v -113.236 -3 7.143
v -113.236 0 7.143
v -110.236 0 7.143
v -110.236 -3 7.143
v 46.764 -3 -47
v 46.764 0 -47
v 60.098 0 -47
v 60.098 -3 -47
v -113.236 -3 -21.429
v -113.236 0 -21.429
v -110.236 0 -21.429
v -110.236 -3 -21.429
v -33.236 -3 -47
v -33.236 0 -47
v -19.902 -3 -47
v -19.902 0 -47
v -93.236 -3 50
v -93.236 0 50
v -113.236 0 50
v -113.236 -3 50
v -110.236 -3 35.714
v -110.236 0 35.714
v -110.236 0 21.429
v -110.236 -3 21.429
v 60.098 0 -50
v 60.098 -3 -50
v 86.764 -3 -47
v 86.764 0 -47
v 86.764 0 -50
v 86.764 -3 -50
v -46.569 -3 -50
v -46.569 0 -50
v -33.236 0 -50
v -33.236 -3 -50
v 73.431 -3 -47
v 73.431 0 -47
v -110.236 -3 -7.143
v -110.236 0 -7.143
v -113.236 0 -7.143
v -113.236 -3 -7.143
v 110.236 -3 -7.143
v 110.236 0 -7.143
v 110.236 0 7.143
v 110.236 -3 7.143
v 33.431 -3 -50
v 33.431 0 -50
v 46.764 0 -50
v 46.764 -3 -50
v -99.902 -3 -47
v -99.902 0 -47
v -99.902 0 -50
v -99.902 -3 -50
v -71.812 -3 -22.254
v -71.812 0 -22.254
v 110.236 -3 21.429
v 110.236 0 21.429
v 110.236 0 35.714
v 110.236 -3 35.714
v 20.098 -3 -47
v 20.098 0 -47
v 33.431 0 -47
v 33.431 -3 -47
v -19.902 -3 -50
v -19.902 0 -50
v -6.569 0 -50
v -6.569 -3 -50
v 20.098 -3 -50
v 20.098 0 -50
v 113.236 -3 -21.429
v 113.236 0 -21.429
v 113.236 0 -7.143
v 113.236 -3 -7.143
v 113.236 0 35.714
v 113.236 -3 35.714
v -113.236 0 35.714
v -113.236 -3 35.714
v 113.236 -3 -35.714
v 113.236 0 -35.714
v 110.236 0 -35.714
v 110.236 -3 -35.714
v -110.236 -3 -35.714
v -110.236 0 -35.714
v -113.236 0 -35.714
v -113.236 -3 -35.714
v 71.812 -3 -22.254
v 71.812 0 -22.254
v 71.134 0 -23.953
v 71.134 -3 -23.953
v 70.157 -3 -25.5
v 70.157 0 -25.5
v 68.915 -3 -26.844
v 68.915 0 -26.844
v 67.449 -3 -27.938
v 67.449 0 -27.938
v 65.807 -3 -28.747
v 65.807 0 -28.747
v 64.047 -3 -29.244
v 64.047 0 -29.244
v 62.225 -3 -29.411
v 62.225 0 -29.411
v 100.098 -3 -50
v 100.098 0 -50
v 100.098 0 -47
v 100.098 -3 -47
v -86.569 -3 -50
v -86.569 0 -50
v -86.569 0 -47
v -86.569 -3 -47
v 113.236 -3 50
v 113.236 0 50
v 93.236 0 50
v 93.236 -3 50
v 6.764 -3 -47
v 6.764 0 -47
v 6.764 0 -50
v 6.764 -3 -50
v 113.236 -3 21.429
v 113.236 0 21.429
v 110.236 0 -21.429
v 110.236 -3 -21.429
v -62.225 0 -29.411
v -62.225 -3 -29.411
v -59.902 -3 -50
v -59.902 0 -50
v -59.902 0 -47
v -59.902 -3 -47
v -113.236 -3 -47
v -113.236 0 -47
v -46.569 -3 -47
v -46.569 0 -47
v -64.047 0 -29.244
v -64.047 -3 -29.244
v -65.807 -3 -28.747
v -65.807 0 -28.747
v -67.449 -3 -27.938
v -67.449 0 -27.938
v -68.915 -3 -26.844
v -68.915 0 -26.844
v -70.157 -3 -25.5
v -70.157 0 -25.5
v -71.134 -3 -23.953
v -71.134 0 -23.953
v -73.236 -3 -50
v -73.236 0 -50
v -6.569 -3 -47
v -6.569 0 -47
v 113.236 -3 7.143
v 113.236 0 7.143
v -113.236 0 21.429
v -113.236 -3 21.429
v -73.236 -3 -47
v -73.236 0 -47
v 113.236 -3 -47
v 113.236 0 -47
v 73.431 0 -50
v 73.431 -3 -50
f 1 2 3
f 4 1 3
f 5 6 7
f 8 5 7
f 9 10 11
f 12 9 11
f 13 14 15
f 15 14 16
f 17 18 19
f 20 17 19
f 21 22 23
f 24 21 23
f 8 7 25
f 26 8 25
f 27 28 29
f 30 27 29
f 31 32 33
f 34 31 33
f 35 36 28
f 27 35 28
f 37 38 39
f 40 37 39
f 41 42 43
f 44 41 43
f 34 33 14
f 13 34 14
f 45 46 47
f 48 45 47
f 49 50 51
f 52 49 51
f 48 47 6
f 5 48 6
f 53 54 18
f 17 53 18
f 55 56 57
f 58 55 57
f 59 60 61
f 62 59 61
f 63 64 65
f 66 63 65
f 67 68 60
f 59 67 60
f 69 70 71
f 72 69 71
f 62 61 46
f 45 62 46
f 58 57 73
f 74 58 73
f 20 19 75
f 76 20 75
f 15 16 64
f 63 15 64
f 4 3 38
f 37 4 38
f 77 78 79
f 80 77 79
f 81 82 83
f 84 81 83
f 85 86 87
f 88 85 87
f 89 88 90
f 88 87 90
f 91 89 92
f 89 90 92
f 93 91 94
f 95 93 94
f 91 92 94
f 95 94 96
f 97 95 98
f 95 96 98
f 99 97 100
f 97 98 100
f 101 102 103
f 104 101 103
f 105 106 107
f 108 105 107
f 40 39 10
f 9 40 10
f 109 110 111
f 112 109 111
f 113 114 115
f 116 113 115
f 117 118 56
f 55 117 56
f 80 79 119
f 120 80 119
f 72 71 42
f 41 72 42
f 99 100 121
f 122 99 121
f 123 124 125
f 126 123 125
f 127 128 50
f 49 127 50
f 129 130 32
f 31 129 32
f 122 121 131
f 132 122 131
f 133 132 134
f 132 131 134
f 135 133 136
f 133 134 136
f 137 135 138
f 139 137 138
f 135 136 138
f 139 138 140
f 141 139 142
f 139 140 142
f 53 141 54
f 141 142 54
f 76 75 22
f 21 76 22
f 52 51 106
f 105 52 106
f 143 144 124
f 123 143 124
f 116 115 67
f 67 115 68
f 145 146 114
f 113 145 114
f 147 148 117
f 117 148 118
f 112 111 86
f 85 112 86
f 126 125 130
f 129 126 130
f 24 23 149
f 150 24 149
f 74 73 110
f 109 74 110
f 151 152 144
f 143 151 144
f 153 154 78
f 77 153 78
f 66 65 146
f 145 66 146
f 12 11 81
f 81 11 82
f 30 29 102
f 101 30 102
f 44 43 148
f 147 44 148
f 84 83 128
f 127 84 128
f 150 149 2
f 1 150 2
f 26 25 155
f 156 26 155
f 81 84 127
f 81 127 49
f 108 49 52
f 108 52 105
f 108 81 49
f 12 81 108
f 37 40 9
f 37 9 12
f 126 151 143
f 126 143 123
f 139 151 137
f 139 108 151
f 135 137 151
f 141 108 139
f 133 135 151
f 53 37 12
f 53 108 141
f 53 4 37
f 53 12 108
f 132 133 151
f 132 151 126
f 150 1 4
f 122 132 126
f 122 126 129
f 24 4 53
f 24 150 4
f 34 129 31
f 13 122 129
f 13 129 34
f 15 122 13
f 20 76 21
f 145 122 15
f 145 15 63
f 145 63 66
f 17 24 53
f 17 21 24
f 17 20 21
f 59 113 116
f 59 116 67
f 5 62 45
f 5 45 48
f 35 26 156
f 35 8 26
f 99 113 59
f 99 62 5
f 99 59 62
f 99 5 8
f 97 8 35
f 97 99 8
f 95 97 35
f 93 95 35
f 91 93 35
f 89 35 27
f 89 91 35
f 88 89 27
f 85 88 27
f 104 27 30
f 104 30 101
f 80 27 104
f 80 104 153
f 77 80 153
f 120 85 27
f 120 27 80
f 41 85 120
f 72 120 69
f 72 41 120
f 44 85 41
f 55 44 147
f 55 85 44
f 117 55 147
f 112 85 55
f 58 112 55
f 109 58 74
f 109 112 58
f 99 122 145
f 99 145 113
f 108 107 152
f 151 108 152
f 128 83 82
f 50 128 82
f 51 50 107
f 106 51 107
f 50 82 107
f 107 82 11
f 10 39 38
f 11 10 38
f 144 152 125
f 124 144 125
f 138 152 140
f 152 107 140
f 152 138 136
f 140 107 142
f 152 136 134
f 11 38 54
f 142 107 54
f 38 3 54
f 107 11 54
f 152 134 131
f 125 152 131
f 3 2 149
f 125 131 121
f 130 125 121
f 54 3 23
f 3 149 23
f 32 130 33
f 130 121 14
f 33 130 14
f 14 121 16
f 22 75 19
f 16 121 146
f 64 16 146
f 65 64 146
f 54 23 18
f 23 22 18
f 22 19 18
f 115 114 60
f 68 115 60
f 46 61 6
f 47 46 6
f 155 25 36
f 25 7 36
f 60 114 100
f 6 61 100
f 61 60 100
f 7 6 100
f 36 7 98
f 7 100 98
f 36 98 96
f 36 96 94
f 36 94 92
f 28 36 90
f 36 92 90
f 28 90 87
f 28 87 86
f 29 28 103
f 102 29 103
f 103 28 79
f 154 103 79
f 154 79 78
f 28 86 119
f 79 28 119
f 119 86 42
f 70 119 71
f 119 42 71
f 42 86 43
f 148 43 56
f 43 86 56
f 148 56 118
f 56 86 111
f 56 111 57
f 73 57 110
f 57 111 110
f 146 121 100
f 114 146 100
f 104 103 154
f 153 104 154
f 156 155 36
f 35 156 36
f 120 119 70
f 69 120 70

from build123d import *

# Parameters (mm, degrees)
F1_DEPTH = 3


# Not quite as in the source:
# - ends of sketch curves that miss each other by under 0.0002 mm in the source are joined


with BuildPart() as f1:
    # F0 (on Front) → F1 (new body)
    with BuildSketch(Plane.XZ):
        with BuildLine():
            Line((60.097833329, -50), (73.431166662, -50))
            Line((73.431166662, -50), (73.431166662, -47))
            Line((73.431166662, -47), (86.7645, -47))
            Line((86.7645, -47), (86.7645, -50.0000007451))
            Line((86.7645, -50.0000007451), (100.097833333, -50.0000007451))
            Line((100.097833333, -50.0000007451), (100.097833333, -47.0000007451))
            Line((100.097833333, -47.0000007451), (113.2355, -47.0000007451))
            Line((113.2355, -47.0000007451), (113.2355, -35.714285716))
            Line((113.2355, -35.714285716), (110.2355, -35.714285716))
            Line((110.2355, -35.714285716), (110.2355, -21.42857143))
            Line((110.2355, -21.42857143), (113.2355, -21.42857143))
            Line((113.2355, -21.42857143), (113.2355, -7.142857144))
            Line((113.2355, -7.142857144), (110.2355, -7.142857144))
            Line((110.2355, -7.142857144), (110.2355, 7.142857142))
            Line((110.2355, 7.142857142), (113.2355, 7.142857142))
            Line((113.2355, 7.142857142), (113.2355, 21.428571428))
            Line((113.2355, 21.428571428), (110.2355, 21.428571428))
            Line((110.2355, 21.428571428), (110.2355, 35.714285714))
            Line((110.2355, 35.714285714), (113.2355, 35.714285714))
            Line((113.2355, 35.714285714), (113.2355, 50))
            Line((113.2355, 50), (93.2355, 50))
            Line((93.2355, 50), (71.8119617716, -22.2537644208))
            ThreePointArc((71.8119617716, -22.2537644208), (68.2066991862, -27.4243868361), (62.2245235205, -29.4110495597))
            Line((62.2245235205, -29.4110495597), (0, -29.4110495597))
            Line((0, -29.4110495597), (-62.2245235205, -29.4110495597))
            ThreePointArc((-62.2245235205, -29.4110495597), (-68.2066991862, -27.4243868361), (-71.8119617716, -22.2537644208))
            Line((-71.8119617716, -22.2537644208), (-93.2355, 50))
            Line((-93.2355, 50), (-113.2355, 50))
            Line((-113.2355, 50), (-113.2355, 35.714285714))
            Line((-113.2355, 35.714285714), (-110.2355, 35.714285714))
            Line((-110.2355, 35.714285714), (-110.2355, 21.428571428))
            Line((-110.2355, 21.428571428), (-113.2355, 21.428571428))
            Line((-113.2355, 21.428571428), (-113.2355, 7.142857142))
            Line((-113.2355, 7.142857142), (-110.2355, 7.142857142))
            Line((-110.2355, 7.142857142), (-110.2355, -7.142857144))
            Line((-110.2355, -7.142857144), (-113.2355, -7.142857144))
            Line((-113.2355, -7.142857144), (-113.2355, -21.42857143))
            Line((-113.2355, -21.42857143), (-110.2355, -21.42857143))
            Line((-110.2355, -21.42857143), (-110.2355, -35.714285716))
            Line((-110.2355, -35.714285716), (-113.2355, -35.714285716))
            Line((-113.2355, -35.714285716), (-113.2355, -47))
            Line((-113.2355, -47), (-99.902166667, -47))
            Line((-99.902166667, -47), (-99.902166667, -50))
            Line((-99.902166667, -50), (-86.568833334, -50))
            Line((-86.568833334, -50), (-86.568833334, -47))
            Line((-86.568833334, -47), (-73.235500001, -47))
            Line((-73.235500001, -47), (-73.235500001, -50))
            Line((-73.235500001, -50), (-59.902166668, -50))
            Line((-59.902166668, -50), (-59.902166668, -47))
            Line((-59.902166668, -47), (-46.568833335, -47))
            Line((-46.568833335, -47), (-46.568833335, -50))
            Line((-46.568833335, -50), (-33.235500002, -50))
            Line((-33.235500002, -50), (-33.235500002, -47))
            Line((-33.235500002, -47), (-19.902166669, -47))
            Line((-19.902166669, -47), (-19.902166669, -50))
            Line((-19.902166669, -50), (-6.568833336, -50))
            Line((-6.568833336, -50), (-6.568833336, -47))
            Line((-6.568833336, -47), (6.764499997, -47))
            Line((6.764499997, -47), (6.764499997, -50))
            Line((6.764499997, -50), (20.09783333, -50))
            Line((20.09783333, -50), (20.09783333, -47))
            Line((20.09783333, -47), (33.431166663, -47))
            Line((33.431166663, -47), (33.431166663, -50))
            Line((33.431166663, -50), (46.764499996, -50))
            Line((46.764499996, -50), (46.764499996, -47))
            Line((46.764499996, -47), (60.097833329, -47))
            Line((60.097833329, -47), (60.097833329, -50))
        make_face()
    extrude(amount=F1_DEPTH)


solid = f1.part
